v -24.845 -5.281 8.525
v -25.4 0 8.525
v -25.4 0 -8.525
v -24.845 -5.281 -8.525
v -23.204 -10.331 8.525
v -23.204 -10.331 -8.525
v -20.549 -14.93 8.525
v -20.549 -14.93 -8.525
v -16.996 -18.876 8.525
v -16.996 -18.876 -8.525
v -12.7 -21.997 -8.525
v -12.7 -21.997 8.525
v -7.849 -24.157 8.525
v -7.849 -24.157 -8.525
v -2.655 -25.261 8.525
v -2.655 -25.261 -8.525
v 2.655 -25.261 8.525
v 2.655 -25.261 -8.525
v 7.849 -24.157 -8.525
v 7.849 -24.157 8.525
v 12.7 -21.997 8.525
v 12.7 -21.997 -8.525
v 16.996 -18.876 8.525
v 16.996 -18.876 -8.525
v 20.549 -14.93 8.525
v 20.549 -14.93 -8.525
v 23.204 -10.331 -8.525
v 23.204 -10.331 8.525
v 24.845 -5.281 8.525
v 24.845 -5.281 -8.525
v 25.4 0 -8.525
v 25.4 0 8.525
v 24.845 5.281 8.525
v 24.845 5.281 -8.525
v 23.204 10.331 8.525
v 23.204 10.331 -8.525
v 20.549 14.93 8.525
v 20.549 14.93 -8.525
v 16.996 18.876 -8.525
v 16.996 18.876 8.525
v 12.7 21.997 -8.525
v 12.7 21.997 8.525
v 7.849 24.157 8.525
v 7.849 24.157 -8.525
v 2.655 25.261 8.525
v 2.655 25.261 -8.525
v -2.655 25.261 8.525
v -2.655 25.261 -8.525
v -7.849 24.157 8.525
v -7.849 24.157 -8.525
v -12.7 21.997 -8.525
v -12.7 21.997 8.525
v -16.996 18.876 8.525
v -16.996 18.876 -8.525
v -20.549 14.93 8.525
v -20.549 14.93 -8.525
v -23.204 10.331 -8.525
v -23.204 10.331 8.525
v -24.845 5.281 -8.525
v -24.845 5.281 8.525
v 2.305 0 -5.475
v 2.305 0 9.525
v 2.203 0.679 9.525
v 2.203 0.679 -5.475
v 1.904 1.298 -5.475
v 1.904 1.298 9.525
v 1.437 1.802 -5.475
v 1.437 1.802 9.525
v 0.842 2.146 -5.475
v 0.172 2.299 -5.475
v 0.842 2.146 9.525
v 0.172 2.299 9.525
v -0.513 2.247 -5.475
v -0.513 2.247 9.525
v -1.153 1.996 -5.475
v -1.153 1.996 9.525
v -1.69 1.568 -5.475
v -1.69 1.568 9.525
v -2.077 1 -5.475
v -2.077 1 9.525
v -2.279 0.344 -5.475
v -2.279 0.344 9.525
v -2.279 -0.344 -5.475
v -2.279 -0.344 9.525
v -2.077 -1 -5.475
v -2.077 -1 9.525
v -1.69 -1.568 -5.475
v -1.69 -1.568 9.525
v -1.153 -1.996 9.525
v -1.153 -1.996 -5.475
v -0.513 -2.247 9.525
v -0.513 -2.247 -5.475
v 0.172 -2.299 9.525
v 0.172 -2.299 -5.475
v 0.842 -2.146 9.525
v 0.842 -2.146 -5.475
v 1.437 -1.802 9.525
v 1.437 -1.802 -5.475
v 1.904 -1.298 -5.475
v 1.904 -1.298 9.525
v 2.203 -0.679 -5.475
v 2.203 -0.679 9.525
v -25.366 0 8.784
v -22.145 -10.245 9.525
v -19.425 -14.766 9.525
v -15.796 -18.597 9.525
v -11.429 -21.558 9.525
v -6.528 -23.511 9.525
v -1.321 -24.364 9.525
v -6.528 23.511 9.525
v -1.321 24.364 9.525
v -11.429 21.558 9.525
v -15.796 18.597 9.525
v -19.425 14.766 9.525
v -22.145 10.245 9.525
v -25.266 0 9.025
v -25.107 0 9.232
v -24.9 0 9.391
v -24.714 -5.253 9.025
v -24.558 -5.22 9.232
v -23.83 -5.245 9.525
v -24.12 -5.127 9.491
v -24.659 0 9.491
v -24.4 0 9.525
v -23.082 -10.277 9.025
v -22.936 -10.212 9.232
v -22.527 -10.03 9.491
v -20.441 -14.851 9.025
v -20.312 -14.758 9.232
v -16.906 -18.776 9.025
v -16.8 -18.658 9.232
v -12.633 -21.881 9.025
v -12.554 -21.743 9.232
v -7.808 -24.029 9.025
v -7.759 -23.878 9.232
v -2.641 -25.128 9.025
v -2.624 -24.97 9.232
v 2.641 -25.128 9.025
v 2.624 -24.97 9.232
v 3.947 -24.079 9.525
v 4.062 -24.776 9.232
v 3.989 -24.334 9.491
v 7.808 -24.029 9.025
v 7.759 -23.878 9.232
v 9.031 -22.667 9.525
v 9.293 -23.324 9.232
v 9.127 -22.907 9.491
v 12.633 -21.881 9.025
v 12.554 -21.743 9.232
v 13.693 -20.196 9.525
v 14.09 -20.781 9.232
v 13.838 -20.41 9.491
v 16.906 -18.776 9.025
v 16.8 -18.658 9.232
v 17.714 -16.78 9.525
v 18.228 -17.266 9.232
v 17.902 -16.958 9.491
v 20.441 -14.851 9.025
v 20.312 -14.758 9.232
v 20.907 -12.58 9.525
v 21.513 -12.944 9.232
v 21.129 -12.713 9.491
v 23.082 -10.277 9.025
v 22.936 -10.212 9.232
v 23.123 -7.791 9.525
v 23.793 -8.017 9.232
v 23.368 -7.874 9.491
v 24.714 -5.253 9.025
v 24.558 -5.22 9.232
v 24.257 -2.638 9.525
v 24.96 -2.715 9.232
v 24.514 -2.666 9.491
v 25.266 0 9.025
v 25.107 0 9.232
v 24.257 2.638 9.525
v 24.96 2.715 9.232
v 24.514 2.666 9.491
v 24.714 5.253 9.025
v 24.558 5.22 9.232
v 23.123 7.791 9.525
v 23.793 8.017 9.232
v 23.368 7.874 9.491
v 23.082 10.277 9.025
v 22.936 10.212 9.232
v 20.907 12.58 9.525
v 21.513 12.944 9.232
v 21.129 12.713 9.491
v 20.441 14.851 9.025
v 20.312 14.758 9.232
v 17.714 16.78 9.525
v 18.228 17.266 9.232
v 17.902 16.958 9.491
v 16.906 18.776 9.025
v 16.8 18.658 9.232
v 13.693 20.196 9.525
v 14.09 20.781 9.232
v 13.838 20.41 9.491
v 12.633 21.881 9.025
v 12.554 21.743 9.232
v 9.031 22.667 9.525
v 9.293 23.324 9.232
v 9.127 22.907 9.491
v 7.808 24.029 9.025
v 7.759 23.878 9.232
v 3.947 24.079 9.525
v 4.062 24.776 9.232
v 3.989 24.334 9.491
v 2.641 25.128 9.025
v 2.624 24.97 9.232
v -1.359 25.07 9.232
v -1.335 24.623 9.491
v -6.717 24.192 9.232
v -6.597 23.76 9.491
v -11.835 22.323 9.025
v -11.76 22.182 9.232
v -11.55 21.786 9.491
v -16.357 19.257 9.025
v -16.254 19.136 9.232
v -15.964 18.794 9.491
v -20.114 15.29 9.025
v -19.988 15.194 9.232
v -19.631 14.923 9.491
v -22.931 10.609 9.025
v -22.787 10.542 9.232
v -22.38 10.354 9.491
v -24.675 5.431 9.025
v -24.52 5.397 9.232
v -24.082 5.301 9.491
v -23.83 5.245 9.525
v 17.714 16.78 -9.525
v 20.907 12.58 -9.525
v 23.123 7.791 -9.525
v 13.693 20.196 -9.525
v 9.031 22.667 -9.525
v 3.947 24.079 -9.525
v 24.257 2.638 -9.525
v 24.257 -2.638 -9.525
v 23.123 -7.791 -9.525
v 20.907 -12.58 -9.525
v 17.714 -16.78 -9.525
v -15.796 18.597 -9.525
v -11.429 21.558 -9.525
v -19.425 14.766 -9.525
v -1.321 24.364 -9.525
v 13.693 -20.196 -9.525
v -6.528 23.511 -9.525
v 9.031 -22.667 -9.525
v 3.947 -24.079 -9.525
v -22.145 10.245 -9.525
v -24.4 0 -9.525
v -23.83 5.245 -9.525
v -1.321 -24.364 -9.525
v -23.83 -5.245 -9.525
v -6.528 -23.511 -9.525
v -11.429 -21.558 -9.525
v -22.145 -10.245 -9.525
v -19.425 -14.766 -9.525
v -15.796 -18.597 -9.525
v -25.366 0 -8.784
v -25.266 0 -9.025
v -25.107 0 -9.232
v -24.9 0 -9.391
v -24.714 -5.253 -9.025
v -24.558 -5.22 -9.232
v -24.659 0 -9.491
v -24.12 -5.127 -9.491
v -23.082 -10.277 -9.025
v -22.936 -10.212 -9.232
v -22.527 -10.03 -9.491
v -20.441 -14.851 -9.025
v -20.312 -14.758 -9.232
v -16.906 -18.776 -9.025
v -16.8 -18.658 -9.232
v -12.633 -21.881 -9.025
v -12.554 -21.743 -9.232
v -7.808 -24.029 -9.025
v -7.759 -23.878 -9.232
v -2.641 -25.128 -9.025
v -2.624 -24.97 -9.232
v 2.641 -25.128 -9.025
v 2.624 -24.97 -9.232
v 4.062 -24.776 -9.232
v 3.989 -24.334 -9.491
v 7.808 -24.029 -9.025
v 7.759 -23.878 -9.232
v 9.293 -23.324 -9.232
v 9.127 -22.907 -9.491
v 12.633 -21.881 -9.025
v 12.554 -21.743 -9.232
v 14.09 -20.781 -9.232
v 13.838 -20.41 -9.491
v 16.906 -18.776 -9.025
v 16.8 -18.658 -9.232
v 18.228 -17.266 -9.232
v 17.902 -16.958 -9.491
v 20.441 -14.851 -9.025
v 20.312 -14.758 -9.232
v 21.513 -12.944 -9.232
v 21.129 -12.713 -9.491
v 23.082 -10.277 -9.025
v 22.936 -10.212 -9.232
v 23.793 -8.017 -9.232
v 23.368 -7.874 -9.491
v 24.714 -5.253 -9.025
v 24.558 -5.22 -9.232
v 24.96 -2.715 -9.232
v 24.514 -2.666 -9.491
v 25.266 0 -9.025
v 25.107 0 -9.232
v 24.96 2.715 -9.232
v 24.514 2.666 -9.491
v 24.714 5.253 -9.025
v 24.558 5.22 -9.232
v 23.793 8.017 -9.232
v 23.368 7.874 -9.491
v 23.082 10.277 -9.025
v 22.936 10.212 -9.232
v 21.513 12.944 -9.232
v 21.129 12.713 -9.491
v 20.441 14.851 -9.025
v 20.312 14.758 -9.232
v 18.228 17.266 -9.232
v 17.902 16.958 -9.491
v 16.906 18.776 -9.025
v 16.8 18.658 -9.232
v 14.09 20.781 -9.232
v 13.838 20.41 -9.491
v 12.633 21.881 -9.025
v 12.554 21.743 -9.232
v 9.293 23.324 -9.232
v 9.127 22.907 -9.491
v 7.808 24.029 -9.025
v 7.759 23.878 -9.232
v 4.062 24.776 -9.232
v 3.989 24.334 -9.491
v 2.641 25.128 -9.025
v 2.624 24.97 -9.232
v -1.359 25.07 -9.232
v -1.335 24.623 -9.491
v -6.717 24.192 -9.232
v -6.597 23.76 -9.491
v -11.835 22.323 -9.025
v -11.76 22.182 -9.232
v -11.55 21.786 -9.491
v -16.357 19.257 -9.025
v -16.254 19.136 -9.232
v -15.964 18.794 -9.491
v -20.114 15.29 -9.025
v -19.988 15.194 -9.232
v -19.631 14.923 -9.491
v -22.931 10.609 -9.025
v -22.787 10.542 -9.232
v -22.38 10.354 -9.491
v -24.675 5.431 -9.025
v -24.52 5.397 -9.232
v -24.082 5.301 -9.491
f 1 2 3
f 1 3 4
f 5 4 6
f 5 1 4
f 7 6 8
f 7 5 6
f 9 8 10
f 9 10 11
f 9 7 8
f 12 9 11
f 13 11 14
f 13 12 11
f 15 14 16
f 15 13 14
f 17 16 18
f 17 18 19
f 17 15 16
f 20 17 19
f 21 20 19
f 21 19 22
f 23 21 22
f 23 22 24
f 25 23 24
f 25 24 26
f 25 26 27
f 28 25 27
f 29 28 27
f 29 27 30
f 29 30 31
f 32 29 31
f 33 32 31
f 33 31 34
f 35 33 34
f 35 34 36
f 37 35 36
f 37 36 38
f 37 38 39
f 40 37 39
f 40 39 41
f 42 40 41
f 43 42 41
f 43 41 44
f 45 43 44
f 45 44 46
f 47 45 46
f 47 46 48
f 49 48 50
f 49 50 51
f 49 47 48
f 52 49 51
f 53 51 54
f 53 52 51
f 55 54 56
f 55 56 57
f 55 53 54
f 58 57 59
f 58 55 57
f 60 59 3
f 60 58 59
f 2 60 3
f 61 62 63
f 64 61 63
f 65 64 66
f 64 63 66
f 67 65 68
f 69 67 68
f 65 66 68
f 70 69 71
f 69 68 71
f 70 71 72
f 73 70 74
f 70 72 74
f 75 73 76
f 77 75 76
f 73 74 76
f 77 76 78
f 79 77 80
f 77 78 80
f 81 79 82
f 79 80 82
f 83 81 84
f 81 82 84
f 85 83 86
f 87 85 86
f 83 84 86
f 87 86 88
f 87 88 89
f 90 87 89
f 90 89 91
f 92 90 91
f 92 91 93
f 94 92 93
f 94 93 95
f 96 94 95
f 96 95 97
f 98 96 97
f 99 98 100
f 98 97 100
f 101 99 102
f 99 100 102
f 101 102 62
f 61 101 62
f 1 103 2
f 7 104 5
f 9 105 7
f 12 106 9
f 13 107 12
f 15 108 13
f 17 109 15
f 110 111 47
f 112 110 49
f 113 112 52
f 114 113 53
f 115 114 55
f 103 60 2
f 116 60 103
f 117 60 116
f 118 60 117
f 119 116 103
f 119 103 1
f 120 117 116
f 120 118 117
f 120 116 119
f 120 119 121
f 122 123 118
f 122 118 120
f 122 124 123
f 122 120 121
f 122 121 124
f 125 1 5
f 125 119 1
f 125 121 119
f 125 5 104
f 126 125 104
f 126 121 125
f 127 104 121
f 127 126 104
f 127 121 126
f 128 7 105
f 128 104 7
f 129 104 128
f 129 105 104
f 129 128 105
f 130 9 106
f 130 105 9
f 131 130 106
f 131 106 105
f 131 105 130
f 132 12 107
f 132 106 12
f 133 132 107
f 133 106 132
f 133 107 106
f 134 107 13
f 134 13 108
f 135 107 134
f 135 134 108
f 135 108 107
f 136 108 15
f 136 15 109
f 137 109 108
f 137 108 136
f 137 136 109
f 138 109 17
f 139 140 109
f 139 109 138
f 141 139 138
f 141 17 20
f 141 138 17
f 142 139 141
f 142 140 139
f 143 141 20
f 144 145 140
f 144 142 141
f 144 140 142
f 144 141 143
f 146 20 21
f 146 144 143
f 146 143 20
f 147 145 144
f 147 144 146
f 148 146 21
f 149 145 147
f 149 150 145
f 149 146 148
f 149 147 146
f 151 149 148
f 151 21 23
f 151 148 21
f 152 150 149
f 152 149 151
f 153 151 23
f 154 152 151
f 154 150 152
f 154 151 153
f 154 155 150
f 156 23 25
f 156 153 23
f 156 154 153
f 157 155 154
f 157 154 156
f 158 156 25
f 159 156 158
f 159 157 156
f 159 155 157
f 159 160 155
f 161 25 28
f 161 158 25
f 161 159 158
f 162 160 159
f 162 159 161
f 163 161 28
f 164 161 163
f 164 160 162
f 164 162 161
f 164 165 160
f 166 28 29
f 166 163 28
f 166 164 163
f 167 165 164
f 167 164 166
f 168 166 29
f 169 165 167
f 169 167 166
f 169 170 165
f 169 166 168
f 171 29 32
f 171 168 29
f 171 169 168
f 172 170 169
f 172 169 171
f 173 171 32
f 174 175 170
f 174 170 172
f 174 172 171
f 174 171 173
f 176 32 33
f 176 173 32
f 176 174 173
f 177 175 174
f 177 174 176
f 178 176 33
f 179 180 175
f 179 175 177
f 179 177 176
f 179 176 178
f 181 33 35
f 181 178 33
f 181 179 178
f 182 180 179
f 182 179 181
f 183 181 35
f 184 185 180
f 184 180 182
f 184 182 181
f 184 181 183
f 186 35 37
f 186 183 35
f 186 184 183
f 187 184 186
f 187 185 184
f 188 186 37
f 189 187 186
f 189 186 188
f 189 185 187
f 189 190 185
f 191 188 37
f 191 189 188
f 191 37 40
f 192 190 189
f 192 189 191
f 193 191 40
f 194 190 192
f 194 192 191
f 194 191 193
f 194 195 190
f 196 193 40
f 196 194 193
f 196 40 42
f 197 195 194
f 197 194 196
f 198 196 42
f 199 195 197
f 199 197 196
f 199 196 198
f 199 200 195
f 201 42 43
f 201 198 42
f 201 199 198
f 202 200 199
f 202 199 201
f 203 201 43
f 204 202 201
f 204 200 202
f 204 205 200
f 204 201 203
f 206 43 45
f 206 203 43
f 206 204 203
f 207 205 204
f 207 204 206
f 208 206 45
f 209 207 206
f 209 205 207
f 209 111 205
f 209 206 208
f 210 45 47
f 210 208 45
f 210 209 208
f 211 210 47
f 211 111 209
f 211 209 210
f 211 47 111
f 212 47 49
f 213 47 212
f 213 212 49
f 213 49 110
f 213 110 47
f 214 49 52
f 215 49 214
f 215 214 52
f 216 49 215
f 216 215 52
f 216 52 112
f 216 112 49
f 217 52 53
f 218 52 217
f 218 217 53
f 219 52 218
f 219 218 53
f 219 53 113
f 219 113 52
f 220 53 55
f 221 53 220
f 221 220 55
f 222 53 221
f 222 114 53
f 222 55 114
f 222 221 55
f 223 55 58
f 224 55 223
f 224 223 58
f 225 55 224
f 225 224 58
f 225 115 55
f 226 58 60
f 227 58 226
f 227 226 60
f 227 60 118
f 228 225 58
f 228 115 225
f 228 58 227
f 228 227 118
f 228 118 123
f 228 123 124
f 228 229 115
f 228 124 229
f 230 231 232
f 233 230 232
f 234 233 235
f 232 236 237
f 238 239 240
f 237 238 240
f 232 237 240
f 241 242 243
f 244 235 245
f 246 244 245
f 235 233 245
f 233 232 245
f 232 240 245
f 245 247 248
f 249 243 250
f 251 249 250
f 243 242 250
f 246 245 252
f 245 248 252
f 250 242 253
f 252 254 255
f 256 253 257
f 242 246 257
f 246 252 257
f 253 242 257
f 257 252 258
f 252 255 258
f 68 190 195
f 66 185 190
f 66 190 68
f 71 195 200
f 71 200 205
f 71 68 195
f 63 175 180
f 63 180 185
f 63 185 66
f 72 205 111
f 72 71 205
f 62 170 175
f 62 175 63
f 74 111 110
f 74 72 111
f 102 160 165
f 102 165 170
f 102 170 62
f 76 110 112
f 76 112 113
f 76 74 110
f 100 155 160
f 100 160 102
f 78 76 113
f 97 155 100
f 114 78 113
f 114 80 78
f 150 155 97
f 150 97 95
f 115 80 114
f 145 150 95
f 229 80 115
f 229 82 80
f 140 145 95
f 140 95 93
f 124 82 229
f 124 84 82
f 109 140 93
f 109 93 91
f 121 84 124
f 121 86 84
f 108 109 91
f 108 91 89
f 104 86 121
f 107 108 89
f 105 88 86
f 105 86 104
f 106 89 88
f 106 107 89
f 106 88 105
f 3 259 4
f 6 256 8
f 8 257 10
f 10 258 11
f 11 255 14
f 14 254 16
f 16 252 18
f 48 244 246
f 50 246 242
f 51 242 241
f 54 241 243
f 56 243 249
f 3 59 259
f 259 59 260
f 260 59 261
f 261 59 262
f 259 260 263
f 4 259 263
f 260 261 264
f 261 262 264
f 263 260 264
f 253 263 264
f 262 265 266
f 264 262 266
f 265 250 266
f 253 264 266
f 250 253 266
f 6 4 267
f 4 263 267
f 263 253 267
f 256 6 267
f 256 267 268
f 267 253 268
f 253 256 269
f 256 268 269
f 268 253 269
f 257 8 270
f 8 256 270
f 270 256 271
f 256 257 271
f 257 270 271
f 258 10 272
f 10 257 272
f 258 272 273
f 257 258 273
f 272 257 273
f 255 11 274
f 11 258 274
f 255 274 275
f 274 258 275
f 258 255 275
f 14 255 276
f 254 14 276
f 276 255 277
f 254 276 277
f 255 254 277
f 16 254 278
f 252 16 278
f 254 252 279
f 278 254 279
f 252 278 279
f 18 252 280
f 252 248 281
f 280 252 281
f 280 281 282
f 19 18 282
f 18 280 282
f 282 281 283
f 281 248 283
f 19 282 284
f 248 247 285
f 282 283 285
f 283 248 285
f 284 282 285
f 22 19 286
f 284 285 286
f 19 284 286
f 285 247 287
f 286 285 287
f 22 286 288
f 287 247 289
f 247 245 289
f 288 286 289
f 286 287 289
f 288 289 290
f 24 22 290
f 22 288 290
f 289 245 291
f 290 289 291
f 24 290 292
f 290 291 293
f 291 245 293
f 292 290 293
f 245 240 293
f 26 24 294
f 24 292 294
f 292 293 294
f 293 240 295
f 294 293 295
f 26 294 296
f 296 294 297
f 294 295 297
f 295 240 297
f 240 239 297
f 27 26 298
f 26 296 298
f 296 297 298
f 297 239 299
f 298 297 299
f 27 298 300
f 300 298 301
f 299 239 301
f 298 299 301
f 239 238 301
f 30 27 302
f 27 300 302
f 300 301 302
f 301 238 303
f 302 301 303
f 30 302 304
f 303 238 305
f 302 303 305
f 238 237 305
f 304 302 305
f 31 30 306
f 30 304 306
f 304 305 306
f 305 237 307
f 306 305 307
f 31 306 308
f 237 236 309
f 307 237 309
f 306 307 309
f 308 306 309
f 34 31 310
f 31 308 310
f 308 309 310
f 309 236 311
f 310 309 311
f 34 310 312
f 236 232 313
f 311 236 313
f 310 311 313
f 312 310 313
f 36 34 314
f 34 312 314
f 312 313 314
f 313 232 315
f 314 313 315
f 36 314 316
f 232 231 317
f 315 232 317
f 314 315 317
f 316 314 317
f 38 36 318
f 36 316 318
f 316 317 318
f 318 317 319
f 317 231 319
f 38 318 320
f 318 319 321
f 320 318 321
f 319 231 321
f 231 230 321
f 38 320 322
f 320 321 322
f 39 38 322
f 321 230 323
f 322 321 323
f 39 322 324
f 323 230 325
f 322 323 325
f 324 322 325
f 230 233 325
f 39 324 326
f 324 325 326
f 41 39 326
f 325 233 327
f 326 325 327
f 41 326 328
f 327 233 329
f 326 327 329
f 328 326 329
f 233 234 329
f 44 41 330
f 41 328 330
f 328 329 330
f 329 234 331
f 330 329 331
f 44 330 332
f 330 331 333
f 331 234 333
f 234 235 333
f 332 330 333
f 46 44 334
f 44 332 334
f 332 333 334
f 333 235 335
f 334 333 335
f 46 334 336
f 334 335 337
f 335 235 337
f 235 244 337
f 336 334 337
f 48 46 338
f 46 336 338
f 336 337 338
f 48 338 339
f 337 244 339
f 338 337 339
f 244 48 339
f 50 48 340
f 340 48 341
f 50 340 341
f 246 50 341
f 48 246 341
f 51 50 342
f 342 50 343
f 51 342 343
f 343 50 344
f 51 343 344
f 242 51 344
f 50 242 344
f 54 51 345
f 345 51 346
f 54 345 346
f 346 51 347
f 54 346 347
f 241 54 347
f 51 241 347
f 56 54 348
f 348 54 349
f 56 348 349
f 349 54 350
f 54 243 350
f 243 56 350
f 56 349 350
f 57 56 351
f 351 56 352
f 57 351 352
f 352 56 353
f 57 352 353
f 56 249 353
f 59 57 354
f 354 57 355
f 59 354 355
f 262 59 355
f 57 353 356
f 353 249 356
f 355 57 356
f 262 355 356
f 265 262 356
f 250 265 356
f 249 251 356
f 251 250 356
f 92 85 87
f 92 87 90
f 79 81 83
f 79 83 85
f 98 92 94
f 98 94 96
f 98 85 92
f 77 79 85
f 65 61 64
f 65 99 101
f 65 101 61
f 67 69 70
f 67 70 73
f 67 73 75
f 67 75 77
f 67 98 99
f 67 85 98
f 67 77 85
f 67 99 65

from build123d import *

# Parameters (mm, degrees)
BODY_SKETCH_R    = 25.4
WHEEL_BODY_DEPTH = 9.525
FILLET_WHEEL_R   = 1
HOLE_SKETCH_R    = 2.305
HOLE_SHAFT_DEPTH = 15


with BuildPart() as part:
    # body sketch → wheel body (new, symmetric)
    with BuildSketch(Plane.XY):
        with Locations(Location((0, 0, 0), (0, 0, 180))):
            Circle(BODY_SKETCH_R)
    extrude(amount=WHEEL_BODY_DEPTH, both=True)

    # fillet wheel
    fillet_wheel_edges = [part.edges().sort_by_distance(p)[0] for p in [
        (25.4, 0, -9.525),
        (25.4, 0, 9.525),
    ]]
    fillet(fillet_wheel_edges, radius=FILLET_WHEEL_R)

    # hole sketch → hole shaft (cut)
    with BuildSketch(Plane.XY.offset(9.525)):
        Circle(HOLE_SKETCH_R)
    extrude(amount=-HOLE_SHAFT_DEPTH, mode=Mode.SUBTRACT)


solid = part.part
